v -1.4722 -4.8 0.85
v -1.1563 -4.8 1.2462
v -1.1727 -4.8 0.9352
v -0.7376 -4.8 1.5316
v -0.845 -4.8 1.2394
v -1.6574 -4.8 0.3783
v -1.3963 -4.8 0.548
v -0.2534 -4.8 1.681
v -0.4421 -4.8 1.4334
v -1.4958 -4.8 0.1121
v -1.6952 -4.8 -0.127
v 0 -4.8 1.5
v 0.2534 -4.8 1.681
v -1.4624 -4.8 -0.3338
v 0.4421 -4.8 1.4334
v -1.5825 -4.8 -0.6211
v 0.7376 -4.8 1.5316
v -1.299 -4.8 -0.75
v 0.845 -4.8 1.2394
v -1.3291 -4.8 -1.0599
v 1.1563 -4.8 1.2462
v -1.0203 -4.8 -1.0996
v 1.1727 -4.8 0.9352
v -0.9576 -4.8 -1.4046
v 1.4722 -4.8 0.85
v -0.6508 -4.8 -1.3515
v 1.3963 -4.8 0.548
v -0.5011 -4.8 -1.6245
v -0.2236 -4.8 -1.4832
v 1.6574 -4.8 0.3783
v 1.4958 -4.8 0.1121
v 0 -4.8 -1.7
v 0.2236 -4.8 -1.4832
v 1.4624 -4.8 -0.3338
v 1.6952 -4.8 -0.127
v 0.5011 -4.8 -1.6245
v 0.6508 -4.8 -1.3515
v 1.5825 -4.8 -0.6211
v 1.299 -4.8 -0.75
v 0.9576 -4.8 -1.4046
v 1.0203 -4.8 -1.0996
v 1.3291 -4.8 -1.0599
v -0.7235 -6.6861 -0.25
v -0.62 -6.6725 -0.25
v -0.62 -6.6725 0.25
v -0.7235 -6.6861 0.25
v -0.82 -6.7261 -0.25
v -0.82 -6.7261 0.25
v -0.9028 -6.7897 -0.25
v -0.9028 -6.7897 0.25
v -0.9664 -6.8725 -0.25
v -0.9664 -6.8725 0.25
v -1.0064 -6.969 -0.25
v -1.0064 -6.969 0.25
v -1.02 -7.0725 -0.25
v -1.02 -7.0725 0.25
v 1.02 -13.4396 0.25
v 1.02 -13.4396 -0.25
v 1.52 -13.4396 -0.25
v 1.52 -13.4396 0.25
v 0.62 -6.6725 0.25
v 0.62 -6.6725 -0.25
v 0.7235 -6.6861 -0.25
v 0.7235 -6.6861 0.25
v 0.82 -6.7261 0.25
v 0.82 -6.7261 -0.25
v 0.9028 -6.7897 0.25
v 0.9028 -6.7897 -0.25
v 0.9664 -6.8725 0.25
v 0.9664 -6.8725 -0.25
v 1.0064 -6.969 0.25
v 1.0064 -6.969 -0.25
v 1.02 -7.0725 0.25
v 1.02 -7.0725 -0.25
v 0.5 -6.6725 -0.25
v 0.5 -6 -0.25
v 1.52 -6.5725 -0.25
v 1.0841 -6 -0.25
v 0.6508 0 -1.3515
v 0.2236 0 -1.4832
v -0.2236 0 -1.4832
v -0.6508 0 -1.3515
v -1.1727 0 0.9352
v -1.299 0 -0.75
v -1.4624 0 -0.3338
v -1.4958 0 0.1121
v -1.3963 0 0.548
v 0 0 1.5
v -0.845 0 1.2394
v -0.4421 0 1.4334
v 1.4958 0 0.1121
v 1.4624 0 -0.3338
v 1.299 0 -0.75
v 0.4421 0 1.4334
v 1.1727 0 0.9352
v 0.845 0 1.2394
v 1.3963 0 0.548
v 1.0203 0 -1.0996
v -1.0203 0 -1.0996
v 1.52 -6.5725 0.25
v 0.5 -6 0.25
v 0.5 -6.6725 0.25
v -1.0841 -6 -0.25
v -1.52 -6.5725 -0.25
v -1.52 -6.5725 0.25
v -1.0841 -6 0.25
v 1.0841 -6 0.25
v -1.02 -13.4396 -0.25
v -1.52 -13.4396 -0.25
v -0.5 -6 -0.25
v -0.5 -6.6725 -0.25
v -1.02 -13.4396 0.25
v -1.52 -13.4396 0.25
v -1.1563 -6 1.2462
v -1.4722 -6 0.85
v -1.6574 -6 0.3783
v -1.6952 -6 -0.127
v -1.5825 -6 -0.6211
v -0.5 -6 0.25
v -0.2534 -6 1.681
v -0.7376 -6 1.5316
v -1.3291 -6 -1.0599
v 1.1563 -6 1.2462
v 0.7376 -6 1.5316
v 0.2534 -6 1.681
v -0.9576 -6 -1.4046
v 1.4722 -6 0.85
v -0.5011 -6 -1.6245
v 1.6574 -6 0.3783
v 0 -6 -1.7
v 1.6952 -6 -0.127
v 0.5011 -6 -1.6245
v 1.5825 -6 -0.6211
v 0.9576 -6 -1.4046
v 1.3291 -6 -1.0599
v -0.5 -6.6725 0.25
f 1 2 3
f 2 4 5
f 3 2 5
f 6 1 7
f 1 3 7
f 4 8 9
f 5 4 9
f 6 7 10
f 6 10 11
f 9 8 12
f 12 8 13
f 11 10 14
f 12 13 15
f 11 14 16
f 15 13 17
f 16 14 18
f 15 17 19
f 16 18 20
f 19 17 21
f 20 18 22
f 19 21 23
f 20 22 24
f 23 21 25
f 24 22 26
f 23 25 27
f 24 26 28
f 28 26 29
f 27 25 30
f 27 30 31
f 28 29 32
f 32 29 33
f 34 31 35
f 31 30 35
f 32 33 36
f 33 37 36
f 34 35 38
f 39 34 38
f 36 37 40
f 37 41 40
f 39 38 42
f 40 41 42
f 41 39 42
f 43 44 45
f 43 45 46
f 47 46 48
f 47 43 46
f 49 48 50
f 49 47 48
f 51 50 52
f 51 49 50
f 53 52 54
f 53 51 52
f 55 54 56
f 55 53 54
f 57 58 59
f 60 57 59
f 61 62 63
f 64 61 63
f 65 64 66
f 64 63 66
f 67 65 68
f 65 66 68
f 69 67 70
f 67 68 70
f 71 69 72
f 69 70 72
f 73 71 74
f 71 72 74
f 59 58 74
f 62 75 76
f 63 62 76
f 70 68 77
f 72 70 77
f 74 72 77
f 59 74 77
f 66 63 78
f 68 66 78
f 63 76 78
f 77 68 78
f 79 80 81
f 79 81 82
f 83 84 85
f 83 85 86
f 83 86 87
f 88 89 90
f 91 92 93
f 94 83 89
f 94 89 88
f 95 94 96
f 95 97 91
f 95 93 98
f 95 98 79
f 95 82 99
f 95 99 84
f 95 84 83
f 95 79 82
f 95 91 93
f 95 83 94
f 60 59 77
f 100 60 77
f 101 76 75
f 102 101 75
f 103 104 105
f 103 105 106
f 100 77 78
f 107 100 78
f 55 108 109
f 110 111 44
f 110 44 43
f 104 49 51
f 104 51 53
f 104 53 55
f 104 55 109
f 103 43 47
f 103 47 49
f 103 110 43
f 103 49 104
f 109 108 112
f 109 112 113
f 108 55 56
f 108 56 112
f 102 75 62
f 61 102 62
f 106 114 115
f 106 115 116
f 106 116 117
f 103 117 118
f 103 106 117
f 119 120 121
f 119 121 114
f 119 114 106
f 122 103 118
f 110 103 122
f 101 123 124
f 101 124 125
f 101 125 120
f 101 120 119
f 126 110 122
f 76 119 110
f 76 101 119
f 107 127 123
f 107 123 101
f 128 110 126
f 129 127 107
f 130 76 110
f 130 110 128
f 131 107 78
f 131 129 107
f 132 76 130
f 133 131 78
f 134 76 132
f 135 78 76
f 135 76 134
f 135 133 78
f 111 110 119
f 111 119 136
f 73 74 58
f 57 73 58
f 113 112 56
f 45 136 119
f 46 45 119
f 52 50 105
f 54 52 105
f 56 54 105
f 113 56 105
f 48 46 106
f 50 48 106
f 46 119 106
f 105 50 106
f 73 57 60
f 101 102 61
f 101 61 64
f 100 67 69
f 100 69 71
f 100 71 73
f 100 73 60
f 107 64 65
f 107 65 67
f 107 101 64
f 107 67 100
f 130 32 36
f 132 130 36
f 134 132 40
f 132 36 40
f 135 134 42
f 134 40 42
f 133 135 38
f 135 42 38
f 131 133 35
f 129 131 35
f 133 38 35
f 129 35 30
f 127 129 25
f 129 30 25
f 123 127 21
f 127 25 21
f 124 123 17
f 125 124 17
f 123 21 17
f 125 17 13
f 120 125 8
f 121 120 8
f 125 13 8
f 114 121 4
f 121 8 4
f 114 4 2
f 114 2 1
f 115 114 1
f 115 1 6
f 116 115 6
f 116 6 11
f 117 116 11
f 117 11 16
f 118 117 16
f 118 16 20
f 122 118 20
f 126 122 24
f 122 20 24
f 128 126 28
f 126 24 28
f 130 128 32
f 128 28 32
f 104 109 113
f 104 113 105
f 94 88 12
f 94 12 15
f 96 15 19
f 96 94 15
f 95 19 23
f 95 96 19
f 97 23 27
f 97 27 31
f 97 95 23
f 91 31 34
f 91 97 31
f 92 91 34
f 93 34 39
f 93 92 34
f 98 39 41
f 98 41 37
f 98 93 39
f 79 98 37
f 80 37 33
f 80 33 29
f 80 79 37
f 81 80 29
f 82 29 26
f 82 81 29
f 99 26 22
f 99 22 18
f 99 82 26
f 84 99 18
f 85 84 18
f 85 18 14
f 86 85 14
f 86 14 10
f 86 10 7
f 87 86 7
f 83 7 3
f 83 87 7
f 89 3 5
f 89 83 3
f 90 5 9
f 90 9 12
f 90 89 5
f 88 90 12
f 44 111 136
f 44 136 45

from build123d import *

# Parameters (mm, degrees)
ESQUISSE1_R             = 1.5
BOSS_EXTRU_1_DEPTH      = 4.8
ESQUISSE2_R             = 1.7
BOSS_EXTRU_2_DEPTH      = 1.2
BOSS_EXTRU_3_DEPTH      = 0.25
BOSS_EXTRU_3_DEPTH_BACK = 0.25


with BuildPart() as part:
    # Esquisse1 → Boss.-Extru.1 (new body)
    with BuildSketch(Plane(origin=(0, 0, 0), x_dir=(1, 0, 0), z_dir=(0, 1, 0))):
        Circle(ESQUISSE1_R)
    extrude(amount=-BOSS_EXTRU_1_DEPTH)

    # Esquisse2 → Boss.-Extru.2 (add)
    with BuildSketch(Plane.XZ.offset(4.8)):
        Circle(ESQUISSE2_R)
    extrude(amount=BOSS_EXTRU_2_DEPTH)

    # Esquisse3 → Boss.-Extru.3 (add, two sides: drawn at the far end of the back side and taken through both)
    with BuildSketch(Plane.XY.offset(-BOSS_EXTRU_3_DEPTH_BACK)):
        with BuildLine():
            Line((0.5, -6), (0.5, -6.672497838))
            Line((0.5, -6.672497838), (0.62, -6.672497838))
            ThreePointArc((0.62, -6.672497838), (0.902842712, -6.789655126), (1.02, -7.072497838))
            Line((1.02, -7.072497838), (1.02, -13.439637098))
            Line((1.02, -13.439637098), (1.52, -13.439637098))
            Line((1.52, -13.439637098), (1.52, -6.572497838))
            Line((1.52, -6.572497838), (1.084066682, -6))
            Line((1.084066682, -6), (0.5, -6))
        make_face()
        with BuildLine():
            Line((-1.084066682, -6), (-0.5, -6))
            Line((-0.5, -6), (-0.5, -6.672497838))
            Line((-0.5, -6.672497838), (-0.62, -6.672497838))
            ThreePointArc((-0.62, -6.672497838), (-0.902842712, -6.789655126), (-1.02, -7.072497838))
            Line((-1.02, -7.072497838), (-1.02, -13.439637098))
            Line((-1.02, -13.439637098), (-1.52, -13.439637098))
            Line((-1.52, -13.439637098), (-1.52, -6.572497838))
            Line((-1.52, -6.572497838), (-1.084066682, -6))
        make_face()
    extrude(amount=BOSS_EXTRU_3_DEPTH + BOSS_EXTRU_3_DEPTH_BACK)


solid = part.part
